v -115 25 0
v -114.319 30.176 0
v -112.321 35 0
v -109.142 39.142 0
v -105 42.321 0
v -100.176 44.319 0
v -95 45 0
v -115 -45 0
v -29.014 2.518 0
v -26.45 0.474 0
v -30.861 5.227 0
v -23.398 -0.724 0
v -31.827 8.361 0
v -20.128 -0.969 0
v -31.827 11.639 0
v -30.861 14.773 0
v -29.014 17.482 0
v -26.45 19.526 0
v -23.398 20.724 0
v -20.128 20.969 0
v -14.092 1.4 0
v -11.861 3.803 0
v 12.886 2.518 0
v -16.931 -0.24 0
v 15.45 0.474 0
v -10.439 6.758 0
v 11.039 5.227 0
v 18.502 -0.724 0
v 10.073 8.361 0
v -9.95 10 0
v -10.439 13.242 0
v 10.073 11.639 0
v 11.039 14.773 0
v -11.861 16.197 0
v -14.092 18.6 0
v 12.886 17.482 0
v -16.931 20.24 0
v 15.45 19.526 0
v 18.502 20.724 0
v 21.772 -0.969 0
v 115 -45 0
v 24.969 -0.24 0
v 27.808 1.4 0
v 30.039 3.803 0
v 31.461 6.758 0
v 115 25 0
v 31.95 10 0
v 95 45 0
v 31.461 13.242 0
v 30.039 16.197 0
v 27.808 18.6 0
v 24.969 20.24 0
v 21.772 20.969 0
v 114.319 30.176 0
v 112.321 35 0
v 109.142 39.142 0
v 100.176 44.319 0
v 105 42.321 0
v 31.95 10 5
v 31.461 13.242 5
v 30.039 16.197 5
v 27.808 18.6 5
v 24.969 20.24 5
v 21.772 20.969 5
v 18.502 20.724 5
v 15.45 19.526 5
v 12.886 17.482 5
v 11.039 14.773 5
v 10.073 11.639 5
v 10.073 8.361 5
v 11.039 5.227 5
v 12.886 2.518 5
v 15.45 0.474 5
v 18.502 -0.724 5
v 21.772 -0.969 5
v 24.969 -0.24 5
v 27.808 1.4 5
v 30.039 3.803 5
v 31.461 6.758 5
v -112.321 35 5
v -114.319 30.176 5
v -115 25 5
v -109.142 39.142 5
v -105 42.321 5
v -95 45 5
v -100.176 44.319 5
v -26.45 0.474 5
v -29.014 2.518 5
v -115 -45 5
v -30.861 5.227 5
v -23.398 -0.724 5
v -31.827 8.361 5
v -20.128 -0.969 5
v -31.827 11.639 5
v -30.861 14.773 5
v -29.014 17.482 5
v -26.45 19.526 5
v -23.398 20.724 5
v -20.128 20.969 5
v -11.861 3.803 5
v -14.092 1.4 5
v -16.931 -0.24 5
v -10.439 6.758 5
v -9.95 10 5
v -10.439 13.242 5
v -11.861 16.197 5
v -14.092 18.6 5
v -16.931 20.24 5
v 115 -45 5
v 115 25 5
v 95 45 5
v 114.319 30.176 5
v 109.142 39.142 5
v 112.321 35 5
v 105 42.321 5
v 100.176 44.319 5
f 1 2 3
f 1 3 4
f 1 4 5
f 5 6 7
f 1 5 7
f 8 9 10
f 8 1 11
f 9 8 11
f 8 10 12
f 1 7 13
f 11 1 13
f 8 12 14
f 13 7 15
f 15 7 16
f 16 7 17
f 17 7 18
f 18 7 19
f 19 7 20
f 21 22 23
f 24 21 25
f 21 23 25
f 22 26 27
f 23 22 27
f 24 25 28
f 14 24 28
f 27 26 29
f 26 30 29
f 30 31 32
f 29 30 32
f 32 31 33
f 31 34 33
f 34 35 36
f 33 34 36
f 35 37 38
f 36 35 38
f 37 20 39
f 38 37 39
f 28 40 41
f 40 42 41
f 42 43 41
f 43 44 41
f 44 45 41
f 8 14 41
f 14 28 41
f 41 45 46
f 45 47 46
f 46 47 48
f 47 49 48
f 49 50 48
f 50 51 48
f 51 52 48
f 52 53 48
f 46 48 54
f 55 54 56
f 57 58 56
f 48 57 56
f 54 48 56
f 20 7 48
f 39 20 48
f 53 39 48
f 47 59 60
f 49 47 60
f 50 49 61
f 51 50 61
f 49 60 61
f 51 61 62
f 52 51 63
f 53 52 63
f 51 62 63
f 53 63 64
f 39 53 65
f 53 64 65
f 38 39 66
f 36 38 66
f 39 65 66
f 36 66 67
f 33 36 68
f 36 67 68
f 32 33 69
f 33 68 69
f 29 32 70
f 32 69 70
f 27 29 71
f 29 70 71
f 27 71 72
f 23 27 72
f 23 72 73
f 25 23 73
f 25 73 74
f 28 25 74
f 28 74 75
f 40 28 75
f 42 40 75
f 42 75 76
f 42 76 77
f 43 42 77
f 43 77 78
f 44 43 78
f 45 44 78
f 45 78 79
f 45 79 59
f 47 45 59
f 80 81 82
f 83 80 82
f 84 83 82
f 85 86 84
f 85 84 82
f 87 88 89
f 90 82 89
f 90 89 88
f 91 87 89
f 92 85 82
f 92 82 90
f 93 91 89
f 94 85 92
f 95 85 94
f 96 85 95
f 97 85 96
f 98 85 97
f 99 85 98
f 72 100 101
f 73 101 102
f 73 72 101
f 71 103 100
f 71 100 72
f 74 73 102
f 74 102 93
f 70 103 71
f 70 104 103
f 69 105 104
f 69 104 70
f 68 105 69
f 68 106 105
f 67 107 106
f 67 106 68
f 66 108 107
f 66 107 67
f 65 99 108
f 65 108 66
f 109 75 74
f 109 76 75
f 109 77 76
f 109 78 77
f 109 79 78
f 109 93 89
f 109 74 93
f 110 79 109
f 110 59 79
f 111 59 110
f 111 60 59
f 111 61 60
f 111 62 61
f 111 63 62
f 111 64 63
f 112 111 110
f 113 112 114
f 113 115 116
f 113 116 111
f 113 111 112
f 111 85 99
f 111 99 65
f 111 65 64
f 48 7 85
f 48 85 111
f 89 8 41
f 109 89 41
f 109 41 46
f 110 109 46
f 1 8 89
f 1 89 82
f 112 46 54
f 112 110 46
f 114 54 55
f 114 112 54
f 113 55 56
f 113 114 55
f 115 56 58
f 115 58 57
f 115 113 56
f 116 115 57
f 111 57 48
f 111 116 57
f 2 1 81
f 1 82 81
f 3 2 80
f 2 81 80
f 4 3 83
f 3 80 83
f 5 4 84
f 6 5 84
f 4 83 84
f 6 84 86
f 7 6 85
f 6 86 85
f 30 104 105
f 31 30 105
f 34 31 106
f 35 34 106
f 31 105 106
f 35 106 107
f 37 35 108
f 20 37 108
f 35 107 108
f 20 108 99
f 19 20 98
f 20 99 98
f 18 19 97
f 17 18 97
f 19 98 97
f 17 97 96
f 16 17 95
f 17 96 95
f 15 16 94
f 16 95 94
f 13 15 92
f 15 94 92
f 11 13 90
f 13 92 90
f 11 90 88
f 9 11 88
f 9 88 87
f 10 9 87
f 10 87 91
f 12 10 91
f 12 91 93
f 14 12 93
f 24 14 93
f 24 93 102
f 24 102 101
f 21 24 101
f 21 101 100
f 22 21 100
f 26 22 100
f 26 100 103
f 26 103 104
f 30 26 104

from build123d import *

# Parameters (mm, degrees)
SKETCH1_W           = 230
SKETCH1_H           = 90
BOSS_EXTRUDE1_DEPTH = 5
FILLET1_R           = 20
CUT_EXTRUDE1_REACH  = 125.592
SKETCH2_R           = 11


with BuildPart() as part:
    # Sketch1 → Boss-Extrude1 (new body)
    with BuildSketch(Plane.XY):
        Rectangle(SKETCH1_W, SKETCH1_H)
    extrude(amount=BOSS_EXTRUDE1_DEPTH)

    # Fillet1
    fillet1_edges = [part.edges().sort_by_distance(p)[0] for p in [
        (-115, 45, 2.5),
        (115, 45, 2.5),
    ]]
    fillet(fillet1_edges, radius=FILLET1_R)

    # Sketch2 → Cut-Extrude1 (cut, up to next)
    with BuildSketch(Plane.XY.offset(5), mode=Mode.PRIVATE) as cut_extrude1_sk1:
        with Locations((-20.95, 10)):
            Circle(SKETCH2_R)
    cut_extrude1_tool1 = extrude(cut_extrude1_sk1.sketch, amount=-CUT_EXTRUDE1_REACH, mode=Mode.PRIVATE) & part.part
    # Sketch2 → Cut-Extrude1 (cut, up to next)
    with BuildSketch(Plane.XY.offset(5), mode=Mode.PRIVATE) as cut_extrude1_sk2:
        with Locations((20.95, 10)):
            Circle(SKETCH2_R)
    cut_extrude1_tool2 = extrude(cut_extrude1_sk2.sketch, amount=-CUT_EXTRUDE1_REACH, mode=Mode.PRIVATE) & part.part
    add(cut_extrude1_tool1.solids().sort_by_distance((-20.95, 10, 5))[0], mode=Mode.SUBTRACT)
    add(cut_extrude1_tool2.solids().sort_by_distance((20.95, 10, 5))[0], mode=Mode.SUBTRACT)


solid = part.part
